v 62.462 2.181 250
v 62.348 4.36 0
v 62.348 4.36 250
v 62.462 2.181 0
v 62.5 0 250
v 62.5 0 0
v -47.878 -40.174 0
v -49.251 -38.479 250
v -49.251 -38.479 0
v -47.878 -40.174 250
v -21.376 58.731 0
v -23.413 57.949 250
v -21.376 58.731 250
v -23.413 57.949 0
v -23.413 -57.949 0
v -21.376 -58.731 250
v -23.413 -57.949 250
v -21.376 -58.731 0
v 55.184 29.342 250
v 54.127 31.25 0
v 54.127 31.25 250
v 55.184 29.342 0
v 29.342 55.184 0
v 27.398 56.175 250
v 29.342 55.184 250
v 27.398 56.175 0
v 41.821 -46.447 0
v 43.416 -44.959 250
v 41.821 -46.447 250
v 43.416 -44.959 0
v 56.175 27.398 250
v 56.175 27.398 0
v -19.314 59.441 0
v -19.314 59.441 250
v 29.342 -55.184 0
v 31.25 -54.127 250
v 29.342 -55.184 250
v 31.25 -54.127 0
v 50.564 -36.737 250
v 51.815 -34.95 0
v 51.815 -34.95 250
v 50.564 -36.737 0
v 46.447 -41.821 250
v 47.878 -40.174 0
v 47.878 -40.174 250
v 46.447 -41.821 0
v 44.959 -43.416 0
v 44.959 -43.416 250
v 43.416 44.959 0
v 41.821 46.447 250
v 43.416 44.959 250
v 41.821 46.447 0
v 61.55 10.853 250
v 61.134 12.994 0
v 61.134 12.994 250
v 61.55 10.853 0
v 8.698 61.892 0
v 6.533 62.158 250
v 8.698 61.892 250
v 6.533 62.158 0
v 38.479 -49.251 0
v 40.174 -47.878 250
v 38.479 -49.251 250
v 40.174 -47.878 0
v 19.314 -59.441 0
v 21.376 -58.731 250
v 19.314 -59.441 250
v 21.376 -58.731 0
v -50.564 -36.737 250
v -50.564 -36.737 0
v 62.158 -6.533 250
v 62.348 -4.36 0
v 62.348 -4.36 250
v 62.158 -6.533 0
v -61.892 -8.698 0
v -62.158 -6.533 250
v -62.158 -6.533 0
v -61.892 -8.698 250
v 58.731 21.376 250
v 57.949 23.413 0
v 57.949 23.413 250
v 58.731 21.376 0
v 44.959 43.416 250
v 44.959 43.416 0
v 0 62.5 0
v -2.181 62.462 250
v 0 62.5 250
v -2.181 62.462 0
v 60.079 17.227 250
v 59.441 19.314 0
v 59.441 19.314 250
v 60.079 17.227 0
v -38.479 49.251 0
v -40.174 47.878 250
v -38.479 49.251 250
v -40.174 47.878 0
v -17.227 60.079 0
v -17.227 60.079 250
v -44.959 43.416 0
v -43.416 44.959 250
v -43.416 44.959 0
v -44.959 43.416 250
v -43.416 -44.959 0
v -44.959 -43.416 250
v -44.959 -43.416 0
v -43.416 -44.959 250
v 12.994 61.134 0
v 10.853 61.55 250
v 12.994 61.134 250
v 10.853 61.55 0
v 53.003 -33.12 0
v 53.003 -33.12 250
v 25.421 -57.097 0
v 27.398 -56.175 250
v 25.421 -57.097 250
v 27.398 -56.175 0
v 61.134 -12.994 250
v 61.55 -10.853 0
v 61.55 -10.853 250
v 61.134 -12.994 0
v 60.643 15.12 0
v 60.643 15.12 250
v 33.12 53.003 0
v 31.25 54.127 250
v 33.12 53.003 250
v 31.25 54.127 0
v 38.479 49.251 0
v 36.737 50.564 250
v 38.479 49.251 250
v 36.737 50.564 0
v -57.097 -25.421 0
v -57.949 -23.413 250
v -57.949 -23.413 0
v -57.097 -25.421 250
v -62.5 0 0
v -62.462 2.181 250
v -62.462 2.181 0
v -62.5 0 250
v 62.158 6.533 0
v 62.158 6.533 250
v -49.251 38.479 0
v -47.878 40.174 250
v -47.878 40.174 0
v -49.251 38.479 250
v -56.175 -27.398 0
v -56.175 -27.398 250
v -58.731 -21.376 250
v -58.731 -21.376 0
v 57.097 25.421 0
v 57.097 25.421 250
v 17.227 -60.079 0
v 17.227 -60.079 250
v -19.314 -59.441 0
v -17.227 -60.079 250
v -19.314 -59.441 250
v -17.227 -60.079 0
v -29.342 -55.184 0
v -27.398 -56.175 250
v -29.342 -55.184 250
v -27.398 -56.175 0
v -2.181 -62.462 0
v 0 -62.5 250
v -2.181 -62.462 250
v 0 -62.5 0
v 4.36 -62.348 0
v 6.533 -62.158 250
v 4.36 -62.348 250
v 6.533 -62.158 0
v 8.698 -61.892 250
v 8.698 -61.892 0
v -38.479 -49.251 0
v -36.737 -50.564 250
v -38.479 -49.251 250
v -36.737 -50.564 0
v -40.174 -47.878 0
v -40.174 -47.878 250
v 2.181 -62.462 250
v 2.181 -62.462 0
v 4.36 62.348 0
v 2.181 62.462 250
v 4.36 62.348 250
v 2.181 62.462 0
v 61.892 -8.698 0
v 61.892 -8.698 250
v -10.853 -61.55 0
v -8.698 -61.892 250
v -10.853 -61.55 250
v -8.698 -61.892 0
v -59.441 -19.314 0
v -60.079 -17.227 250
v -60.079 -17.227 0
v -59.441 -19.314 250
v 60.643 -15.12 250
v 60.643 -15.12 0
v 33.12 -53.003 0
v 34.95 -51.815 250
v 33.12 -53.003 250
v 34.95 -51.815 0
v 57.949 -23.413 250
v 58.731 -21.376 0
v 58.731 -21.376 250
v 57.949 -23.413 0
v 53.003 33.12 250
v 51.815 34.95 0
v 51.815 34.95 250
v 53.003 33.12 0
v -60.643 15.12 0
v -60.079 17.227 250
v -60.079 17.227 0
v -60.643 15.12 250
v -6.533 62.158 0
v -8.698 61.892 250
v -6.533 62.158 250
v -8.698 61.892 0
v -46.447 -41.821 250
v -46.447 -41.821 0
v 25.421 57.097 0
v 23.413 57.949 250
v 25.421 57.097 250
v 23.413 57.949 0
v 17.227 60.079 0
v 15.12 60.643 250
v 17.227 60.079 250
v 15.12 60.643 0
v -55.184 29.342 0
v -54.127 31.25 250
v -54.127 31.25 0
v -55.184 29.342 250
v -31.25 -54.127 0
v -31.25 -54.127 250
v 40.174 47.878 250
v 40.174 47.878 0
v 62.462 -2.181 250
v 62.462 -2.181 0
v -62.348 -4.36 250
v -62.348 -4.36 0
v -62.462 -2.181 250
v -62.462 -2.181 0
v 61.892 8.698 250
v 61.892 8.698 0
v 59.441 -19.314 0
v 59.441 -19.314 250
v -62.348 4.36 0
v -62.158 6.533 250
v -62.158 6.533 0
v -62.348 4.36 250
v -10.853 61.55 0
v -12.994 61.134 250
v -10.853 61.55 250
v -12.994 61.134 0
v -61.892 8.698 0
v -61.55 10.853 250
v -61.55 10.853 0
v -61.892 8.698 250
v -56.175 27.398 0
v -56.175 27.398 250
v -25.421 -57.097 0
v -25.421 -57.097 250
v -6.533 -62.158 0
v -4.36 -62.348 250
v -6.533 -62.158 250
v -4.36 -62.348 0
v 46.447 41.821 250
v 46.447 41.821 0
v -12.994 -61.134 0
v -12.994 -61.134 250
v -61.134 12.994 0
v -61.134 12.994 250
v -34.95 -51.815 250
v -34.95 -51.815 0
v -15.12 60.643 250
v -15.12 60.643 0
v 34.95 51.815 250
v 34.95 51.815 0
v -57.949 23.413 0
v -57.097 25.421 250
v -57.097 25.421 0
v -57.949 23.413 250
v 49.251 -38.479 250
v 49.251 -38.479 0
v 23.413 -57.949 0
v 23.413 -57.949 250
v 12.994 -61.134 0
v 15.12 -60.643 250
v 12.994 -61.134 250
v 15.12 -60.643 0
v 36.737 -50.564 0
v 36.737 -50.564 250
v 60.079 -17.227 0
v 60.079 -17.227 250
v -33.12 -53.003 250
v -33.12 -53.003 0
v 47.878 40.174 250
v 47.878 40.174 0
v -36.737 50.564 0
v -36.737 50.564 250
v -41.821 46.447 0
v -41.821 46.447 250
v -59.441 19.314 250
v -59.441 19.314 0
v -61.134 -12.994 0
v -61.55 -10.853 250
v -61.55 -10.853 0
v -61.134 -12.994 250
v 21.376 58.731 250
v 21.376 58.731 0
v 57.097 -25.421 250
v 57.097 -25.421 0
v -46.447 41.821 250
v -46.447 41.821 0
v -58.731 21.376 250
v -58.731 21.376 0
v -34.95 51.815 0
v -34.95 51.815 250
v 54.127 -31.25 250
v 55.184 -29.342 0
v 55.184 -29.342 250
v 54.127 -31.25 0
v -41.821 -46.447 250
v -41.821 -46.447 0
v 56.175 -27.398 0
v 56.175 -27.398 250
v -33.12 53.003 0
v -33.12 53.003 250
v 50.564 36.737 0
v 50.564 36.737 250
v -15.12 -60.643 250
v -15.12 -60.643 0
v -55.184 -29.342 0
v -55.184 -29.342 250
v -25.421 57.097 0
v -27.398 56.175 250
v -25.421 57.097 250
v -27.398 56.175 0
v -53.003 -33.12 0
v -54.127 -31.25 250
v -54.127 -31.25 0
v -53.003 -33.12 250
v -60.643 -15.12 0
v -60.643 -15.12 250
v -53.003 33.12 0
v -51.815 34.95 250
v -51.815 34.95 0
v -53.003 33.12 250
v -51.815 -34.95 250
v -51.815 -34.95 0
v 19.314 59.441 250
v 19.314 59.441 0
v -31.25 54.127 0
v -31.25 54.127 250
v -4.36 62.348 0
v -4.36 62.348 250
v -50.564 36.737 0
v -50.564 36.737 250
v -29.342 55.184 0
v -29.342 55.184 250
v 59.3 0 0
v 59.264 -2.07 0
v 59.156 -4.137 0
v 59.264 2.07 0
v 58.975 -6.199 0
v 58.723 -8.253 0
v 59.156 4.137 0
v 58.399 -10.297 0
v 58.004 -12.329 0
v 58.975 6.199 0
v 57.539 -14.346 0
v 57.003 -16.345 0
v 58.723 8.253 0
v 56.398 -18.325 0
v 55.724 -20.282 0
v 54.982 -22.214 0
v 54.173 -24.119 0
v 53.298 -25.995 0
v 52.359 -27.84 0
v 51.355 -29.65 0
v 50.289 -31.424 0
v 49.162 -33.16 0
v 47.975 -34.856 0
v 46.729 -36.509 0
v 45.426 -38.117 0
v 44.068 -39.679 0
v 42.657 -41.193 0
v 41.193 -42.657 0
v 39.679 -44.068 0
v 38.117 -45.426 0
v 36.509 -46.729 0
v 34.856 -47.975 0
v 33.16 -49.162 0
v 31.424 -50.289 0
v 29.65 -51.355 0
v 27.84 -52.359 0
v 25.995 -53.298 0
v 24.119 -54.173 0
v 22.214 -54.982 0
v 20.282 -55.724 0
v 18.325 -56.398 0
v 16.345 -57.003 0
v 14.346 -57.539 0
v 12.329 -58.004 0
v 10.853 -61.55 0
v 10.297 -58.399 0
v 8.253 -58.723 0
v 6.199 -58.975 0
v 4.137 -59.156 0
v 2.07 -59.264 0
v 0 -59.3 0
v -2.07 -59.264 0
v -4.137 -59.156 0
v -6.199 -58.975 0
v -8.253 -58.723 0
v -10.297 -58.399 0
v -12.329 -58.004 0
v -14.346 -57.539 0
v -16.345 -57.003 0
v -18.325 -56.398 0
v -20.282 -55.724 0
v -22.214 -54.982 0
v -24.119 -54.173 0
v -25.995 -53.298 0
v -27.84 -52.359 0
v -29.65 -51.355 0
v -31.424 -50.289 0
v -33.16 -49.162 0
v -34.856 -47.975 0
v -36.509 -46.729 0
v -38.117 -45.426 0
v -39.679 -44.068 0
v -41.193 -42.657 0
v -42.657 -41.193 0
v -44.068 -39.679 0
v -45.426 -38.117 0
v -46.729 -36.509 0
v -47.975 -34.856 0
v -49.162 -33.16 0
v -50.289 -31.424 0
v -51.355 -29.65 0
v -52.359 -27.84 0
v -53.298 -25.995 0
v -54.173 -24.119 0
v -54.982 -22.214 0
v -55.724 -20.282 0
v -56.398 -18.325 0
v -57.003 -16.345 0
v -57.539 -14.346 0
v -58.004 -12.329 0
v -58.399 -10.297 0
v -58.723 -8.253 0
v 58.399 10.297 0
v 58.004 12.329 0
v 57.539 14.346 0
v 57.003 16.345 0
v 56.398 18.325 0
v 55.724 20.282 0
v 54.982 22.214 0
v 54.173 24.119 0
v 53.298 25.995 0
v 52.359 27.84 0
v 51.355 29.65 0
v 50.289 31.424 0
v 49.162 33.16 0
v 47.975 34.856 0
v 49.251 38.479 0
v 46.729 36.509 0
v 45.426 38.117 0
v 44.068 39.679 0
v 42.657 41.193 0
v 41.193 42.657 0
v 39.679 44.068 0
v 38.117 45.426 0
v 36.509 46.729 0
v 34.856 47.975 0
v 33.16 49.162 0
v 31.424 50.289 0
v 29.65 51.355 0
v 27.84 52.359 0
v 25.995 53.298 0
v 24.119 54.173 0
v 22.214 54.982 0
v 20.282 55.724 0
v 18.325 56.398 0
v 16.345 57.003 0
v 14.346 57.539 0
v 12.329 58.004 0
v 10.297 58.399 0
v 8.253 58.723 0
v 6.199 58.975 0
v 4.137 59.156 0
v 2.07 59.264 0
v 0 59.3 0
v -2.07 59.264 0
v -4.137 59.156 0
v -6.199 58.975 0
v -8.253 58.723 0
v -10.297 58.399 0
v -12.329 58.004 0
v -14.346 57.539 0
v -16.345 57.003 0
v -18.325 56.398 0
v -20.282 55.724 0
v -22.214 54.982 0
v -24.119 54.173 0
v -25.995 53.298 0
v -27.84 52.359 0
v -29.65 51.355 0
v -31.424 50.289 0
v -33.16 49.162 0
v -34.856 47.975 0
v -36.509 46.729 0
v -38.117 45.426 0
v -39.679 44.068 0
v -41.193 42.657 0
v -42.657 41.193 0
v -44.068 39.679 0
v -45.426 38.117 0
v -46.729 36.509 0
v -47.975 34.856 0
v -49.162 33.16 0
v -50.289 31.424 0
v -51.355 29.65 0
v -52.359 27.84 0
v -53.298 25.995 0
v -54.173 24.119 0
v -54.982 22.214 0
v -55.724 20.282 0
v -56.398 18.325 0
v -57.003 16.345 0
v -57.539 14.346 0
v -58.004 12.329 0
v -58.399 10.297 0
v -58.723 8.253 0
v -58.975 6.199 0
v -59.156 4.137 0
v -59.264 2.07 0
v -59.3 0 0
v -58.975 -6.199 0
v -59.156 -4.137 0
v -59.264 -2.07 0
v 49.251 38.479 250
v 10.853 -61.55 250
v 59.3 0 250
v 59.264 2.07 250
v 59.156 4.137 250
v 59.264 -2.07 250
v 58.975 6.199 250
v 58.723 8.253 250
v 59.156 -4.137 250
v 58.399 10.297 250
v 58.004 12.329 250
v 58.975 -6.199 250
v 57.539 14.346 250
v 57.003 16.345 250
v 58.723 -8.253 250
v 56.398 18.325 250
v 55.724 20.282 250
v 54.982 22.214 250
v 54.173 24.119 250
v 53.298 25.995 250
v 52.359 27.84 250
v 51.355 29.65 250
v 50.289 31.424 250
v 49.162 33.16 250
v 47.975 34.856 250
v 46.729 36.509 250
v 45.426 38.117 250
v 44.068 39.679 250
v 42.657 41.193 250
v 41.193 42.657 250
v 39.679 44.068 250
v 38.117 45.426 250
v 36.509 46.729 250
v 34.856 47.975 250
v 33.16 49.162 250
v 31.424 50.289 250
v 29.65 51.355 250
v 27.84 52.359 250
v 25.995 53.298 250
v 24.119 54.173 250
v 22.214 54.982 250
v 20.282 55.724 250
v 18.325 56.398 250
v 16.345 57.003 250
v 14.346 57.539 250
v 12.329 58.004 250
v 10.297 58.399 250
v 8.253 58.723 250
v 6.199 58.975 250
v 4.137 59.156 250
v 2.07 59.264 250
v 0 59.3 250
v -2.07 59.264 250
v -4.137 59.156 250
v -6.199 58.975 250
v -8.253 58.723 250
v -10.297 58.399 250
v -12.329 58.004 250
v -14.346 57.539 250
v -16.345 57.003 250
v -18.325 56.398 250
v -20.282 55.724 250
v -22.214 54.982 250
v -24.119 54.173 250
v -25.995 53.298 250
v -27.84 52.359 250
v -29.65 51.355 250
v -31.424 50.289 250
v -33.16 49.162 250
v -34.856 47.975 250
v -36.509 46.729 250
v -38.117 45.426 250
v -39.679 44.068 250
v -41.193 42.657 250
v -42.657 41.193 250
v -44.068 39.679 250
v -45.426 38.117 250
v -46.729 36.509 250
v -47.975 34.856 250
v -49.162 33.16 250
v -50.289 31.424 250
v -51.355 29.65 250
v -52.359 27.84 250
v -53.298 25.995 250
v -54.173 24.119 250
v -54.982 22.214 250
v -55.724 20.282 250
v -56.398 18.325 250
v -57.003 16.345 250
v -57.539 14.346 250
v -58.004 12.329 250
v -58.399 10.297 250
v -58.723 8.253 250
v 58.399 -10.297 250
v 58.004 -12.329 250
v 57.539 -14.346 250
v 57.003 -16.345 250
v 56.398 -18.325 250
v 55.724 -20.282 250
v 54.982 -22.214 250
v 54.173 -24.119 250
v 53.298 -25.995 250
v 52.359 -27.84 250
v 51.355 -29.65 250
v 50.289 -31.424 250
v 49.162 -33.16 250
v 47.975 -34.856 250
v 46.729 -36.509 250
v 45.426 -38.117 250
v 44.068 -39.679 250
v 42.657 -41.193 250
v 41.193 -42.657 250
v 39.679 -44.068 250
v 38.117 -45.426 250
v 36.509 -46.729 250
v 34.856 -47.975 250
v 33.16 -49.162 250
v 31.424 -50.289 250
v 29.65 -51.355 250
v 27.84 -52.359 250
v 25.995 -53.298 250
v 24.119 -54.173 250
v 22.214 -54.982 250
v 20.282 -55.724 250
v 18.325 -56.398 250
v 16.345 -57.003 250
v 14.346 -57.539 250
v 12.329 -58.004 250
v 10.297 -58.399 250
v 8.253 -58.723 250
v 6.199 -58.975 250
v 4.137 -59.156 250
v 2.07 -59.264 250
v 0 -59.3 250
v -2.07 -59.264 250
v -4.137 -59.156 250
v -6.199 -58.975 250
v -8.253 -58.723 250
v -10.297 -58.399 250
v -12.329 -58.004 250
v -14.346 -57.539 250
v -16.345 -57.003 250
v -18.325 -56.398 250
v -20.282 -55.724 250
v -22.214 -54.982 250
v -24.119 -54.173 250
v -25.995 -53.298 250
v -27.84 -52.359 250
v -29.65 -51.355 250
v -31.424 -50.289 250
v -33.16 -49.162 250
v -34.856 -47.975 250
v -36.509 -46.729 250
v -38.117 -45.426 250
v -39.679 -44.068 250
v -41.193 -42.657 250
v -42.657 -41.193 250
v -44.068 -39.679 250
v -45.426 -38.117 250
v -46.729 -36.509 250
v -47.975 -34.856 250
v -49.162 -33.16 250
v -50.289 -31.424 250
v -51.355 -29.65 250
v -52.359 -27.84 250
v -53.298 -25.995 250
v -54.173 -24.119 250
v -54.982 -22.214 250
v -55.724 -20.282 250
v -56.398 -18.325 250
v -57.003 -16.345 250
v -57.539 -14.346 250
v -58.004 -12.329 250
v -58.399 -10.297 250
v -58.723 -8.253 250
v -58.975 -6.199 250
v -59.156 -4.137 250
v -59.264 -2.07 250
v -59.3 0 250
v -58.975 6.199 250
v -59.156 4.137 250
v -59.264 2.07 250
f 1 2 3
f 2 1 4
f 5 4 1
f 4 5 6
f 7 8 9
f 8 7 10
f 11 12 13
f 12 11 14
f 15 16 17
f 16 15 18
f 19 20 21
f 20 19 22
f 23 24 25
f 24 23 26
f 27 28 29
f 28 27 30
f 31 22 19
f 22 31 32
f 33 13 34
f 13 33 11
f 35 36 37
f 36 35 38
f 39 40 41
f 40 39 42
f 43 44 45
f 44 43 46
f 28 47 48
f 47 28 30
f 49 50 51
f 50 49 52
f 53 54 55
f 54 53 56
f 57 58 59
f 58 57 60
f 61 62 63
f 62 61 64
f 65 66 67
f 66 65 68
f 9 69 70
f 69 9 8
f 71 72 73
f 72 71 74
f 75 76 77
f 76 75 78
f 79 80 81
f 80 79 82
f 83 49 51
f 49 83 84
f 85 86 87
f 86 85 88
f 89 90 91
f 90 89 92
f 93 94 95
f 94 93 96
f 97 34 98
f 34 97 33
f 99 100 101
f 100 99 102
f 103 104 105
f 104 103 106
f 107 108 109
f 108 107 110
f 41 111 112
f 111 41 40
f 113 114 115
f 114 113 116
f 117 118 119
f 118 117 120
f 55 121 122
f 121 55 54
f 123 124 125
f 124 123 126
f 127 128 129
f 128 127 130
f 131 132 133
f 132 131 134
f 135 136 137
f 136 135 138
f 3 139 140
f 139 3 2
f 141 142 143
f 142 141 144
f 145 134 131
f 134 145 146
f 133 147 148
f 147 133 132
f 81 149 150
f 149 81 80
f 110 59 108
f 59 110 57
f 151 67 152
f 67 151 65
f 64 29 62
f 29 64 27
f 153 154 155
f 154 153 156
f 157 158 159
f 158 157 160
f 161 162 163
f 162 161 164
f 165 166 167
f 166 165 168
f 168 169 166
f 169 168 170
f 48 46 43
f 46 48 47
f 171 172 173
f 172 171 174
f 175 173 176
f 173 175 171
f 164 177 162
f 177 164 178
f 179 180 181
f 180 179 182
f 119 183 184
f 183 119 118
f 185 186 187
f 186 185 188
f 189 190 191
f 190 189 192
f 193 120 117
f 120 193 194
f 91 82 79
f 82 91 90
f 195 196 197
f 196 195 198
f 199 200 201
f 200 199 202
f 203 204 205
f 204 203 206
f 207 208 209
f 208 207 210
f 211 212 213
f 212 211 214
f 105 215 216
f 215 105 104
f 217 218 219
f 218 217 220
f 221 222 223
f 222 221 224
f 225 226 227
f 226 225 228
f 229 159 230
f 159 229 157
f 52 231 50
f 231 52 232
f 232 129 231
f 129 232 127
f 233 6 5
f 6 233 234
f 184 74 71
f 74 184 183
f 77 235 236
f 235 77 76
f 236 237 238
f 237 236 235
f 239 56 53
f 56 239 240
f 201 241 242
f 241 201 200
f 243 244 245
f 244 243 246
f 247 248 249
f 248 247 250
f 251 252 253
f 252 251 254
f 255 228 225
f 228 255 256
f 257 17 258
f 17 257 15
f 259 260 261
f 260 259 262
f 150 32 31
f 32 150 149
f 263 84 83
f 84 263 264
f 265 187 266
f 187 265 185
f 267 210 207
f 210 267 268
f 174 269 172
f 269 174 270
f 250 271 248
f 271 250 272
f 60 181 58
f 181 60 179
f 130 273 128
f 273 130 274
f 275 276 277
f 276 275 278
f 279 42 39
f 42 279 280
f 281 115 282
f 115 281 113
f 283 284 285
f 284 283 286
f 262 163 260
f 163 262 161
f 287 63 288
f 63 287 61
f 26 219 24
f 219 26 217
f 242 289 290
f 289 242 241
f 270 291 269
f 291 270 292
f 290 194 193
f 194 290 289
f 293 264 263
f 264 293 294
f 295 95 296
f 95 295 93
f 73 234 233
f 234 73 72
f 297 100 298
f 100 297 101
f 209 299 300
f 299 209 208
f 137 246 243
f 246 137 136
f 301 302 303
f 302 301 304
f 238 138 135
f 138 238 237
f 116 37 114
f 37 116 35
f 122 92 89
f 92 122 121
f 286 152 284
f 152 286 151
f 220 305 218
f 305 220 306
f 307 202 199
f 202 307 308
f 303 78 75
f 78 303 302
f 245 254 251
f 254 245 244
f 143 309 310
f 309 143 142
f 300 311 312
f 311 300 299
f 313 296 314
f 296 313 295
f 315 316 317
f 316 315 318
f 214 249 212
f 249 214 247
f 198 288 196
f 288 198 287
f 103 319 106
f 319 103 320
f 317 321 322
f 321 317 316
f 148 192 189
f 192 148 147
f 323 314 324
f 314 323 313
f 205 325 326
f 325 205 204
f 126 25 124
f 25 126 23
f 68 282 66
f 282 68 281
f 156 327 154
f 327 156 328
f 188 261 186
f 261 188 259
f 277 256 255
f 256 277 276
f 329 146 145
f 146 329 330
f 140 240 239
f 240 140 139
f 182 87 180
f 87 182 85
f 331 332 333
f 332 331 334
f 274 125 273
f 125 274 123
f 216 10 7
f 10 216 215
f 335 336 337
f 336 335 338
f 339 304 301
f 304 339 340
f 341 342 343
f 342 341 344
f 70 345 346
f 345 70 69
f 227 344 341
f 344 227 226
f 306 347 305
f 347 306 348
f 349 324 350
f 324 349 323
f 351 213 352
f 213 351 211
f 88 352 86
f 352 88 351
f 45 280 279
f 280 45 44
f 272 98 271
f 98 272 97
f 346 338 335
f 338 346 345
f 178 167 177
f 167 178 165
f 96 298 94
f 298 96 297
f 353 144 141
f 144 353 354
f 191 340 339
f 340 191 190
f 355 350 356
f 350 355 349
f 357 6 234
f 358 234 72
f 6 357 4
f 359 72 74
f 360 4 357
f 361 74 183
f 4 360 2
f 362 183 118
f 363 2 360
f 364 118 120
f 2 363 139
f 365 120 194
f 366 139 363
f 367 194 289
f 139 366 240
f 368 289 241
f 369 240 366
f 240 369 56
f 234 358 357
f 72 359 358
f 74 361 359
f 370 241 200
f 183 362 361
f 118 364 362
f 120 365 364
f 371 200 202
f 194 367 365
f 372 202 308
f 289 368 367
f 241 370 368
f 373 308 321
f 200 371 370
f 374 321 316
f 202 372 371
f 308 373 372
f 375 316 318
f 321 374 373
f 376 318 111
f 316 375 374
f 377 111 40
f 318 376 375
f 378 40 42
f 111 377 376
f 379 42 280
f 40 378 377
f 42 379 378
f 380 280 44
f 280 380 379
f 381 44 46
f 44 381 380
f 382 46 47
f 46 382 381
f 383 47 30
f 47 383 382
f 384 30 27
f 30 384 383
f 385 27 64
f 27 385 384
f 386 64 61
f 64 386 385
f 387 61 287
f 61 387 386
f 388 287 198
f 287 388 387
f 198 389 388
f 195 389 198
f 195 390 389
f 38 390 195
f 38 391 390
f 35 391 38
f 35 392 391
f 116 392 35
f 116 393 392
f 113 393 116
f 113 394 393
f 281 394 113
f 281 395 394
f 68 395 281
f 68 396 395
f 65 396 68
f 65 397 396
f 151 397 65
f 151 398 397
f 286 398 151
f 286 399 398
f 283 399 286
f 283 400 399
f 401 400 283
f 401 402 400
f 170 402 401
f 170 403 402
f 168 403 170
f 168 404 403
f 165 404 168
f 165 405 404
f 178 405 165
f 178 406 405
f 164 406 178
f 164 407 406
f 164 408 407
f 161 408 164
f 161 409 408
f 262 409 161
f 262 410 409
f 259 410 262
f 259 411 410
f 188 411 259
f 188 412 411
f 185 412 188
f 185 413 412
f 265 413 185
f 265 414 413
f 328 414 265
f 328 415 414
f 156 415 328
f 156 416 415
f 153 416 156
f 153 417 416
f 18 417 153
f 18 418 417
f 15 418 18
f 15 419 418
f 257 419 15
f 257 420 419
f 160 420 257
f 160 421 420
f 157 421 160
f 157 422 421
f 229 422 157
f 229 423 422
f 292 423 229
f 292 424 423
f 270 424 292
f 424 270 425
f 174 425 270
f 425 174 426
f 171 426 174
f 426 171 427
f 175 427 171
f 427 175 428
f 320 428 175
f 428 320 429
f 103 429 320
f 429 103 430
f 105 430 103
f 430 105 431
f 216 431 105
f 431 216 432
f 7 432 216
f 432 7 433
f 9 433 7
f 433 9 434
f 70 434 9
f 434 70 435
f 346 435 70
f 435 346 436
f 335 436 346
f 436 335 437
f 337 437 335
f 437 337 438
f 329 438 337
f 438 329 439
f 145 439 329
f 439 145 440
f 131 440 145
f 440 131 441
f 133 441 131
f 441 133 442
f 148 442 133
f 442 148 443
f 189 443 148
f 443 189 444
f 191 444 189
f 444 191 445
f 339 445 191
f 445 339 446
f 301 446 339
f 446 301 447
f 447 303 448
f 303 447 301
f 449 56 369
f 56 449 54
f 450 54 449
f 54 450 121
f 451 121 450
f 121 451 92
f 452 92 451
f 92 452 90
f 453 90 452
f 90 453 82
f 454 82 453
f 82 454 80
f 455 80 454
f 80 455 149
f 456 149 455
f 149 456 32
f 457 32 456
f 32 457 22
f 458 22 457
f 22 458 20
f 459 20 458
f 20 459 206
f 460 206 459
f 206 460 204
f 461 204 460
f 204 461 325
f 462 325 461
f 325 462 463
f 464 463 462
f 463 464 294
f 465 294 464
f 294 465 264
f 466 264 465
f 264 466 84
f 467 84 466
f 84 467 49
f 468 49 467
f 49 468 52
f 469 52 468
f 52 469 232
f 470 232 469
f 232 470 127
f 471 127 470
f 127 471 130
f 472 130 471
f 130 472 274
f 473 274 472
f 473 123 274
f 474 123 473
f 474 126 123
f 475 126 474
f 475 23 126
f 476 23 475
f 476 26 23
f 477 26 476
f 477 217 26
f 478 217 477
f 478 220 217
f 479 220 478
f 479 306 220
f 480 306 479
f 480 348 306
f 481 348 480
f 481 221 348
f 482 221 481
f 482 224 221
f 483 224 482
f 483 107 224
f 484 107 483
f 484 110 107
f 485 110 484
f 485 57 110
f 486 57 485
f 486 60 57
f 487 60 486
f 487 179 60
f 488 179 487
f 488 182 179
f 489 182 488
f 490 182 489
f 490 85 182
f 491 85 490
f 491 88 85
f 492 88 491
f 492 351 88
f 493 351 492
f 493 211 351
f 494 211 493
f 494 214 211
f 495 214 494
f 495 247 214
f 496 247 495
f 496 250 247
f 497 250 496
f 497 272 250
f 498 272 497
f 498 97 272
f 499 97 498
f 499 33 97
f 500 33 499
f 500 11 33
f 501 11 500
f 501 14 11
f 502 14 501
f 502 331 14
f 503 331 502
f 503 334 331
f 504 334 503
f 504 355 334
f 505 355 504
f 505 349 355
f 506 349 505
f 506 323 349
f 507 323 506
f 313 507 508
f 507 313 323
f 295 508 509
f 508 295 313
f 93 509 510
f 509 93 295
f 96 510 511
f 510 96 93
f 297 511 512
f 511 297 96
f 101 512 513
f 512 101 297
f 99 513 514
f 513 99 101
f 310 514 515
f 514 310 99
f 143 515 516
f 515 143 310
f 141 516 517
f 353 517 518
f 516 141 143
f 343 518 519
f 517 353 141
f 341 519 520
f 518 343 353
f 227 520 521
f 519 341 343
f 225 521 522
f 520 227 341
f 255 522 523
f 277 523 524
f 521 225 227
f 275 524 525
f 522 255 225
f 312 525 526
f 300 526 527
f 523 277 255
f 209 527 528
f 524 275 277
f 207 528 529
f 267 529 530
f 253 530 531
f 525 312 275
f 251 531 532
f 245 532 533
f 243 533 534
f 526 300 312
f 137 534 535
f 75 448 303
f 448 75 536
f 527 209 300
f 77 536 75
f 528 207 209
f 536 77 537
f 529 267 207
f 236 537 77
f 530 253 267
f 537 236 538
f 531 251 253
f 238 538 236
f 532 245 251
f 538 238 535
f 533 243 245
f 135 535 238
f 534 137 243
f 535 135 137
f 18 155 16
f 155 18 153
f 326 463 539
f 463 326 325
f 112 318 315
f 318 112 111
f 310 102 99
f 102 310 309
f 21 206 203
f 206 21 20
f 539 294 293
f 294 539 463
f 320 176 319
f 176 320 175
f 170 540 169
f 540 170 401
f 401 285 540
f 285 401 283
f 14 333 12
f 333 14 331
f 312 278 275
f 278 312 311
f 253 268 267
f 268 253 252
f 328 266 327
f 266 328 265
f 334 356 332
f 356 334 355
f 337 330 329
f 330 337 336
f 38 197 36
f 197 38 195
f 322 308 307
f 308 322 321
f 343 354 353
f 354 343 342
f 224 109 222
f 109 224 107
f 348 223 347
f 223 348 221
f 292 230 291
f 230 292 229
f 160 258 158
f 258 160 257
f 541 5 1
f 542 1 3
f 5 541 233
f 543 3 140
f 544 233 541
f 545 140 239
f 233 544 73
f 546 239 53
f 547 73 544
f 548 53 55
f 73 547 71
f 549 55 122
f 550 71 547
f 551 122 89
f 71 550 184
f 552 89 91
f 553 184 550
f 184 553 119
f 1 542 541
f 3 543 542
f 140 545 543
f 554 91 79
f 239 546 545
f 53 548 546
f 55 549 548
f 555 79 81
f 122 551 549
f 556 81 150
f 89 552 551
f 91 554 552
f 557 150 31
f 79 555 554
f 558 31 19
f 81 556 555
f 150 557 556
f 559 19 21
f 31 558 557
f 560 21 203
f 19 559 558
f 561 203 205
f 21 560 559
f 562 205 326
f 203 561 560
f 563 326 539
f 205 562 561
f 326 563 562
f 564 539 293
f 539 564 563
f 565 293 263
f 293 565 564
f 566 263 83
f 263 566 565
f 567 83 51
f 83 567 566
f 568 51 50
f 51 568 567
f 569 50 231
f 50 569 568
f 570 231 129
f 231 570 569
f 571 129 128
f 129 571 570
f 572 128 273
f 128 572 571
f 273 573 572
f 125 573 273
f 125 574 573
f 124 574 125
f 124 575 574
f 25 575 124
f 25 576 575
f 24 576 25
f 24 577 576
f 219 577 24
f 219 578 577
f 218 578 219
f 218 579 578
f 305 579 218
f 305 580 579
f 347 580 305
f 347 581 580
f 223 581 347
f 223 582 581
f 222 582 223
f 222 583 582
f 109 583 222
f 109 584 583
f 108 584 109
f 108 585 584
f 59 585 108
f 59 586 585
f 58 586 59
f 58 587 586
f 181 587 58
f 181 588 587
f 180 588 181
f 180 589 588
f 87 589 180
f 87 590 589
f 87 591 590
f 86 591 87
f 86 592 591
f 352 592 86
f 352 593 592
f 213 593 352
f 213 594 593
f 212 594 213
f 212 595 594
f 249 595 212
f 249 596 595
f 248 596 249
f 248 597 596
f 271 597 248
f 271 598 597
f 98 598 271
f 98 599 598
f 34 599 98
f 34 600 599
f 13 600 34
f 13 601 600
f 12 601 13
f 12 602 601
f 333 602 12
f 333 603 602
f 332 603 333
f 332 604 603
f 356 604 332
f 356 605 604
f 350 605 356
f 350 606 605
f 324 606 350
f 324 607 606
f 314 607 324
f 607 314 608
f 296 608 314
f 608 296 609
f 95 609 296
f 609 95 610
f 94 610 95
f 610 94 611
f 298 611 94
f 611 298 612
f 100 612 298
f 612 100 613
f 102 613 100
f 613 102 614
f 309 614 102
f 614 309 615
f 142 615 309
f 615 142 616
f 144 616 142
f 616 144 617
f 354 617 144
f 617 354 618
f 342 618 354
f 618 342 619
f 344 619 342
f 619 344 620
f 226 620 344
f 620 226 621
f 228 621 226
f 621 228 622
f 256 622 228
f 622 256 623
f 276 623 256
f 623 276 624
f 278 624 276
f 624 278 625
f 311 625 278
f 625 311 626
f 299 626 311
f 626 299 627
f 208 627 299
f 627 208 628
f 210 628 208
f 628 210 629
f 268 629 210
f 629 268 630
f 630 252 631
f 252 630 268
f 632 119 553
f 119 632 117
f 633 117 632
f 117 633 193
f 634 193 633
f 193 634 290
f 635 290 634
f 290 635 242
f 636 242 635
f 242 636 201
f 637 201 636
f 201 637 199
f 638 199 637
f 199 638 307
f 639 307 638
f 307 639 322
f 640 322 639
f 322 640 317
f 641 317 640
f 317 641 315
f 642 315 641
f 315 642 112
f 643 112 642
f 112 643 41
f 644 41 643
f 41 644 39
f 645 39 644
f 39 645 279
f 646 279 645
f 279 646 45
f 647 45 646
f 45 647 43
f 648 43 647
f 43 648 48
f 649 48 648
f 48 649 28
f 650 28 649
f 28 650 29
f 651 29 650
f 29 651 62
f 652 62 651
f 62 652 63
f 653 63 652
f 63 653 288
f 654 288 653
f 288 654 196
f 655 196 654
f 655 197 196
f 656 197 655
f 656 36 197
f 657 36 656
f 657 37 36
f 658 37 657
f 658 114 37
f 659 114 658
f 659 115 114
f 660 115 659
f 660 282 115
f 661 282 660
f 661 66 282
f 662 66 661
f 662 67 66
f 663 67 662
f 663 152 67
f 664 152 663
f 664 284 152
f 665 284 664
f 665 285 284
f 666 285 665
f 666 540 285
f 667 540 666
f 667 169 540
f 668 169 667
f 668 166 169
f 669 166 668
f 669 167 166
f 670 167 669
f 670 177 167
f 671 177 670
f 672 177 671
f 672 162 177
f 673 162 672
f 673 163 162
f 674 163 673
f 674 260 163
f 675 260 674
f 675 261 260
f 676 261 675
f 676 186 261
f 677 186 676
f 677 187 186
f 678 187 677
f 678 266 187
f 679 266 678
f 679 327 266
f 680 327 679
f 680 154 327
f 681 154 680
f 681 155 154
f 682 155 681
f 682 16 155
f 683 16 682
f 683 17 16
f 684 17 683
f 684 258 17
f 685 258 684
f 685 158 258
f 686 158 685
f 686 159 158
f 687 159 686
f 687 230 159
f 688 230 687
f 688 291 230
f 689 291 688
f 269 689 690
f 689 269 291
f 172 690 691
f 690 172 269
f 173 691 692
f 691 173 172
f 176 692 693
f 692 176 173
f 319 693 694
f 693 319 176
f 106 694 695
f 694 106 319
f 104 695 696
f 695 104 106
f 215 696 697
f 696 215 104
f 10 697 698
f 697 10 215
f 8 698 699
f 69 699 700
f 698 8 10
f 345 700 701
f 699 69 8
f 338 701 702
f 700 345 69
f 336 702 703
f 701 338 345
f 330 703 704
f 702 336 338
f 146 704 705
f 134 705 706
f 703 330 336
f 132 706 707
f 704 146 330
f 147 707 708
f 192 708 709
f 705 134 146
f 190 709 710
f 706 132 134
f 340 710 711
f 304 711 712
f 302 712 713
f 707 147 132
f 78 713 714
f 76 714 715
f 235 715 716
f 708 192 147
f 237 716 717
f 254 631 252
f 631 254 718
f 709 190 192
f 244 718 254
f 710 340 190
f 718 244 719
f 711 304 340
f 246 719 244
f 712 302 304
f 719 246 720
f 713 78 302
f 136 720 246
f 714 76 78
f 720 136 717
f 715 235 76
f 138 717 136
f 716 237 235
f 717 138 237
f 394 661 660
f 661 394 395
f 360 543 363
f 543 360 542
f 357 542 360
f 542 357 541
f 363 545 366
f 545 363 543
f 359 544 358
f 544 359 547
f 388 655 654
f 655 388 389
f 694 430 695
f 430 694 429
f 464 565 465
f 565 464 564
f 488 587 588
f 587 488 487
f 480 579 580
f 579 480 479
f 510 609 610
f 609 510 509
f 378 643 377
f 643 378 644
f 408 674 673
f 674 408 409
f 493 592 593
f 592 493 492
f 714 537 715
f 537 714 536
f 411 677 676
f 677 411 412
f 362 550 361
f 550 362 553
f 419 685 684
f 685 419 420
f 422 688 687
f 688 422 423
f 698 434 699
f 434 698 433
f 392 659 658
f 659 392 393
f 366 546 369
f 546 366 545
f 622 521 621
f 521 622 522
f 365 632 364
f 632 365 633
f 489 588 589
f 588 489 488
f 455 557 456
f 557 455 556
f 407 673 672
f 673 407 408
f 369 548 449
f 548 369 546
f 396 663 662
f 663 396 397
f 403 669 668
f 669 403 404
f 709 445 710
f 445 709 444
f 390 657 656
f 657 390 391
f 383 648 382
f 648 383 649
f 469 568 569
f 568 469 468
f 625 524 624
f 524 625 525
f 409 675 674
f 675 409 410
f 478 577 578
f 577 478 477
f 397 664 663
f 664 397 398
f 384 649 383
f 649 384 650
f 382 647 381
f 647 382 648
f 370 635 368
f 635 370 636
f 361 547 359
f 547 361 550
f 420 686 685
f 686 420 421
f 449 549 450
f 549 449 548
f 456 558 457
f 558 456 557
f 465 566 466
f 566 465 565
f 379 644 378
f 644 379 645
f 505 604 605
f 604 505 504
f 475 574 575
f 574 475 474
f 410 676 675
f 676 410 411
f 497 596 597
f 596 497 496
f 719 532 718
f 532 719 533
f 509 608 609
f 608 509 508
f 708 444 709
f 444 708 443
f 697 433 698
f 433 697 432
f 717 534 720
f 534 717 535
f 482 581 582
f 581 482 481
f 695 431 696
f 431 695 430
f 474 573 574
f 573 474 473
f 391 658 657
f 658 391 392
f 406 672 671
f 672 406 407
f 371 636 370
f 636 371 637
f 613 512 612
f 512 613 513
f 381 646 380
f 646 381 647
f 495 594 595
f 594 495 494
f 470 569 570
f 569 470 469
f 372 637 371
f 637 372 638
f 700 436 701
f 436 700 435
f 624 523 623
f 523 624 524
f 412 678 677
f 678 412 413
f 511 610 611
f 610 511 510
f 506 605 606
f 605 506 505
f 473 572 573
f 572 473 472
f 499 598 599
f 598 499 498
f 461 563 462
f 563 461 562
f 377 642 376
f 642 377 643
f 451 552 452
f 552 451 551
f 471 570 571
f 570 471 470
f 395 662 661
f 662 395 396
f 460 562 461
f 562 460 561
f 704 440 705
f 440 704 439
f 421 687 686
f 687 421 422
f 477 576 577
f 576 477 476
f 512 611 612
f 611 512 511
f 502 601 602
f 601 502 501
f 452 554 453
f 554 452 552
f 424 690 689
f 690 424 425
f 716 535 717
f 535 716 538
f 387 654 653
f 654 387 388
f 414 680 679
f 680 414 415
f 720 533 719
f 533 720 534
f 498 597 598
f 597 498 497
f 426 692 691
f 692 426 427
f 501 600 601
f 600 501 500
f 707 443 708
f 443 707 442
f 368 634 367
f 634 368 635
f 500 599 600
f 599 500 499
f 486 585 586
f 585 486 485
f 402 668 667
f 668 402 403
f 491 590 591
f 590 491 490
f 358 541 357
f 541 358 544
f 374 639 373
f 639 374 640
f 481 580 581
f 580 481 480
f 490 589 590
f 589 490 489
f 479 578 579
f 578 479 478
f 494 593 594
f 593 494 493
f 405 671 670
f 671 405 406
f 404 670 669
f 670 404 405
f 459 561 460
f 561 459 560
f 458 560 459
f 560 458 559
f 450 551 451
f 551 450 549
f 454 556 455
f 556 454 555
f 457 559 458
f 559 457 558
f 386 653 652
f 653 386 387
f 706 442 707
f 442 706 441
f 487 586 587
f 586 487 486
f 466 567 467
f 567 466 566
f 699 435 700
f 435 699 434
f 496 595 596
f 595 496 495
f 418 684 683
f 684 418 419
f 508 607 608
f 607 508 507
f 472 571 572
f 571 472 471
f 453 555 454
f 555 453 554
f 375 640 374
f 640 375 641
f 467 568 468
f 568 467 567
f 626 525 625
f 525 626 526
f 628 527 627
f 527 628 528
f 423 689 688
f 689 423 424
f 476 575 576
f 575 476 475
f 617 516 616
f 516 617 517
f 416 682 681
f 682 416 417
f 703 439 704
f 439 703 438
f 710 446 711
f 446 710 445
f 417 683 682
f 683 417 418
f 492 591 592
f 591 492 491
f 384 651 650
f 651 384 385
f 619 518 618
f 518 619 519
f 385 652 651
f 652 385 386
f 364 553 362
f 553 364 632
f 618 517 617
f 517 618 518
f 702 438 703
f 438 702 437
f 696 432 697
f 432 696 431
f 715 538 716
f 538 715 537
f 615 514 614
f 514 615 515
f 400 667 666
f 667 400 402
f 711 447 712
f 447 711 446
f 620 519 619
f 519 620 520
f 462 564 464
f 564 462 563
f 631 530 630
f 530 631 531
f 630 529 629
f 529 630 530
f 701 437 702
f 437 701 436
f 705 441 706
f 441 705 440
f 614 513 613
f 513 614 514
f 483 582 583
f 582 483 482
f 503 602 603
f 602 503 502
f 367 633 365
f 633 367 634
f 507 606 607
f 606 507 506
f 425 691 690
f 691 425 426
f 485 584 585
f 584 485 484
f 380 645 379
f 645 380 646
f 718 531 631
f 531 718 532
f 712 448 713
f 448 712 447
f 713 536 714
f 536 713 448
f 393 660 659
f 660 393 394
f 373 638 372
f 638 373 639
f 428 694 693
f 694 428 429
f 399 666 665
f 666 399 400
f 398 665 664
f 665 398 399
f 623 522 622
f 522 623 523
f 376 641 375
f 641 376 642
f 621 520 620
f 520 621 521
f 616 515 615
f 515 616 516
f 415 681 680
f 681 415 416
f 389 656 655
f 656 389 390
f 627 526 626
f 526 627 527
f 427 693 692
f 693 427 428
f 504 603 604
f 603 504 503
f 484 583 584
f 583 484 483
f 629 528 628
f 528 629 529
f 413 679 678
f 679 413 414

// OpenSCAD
$fn = 180;

// HT pipe parameters (approximate, adjustable)
pipe_dn = 125;          // nominal diameter (mm)
pipe_length = 250;      // length (mm)
wall_thickness = 3.2;   // typical HT wall thickness (mm), adjust if needed

// Derived
outer_d = pipe_dn;
inner_d = outer_d - 2*wall_thickness;

module ht_pipe(od, id, L) {
    difference() {
        cylinder(h = L, d = od, center = false);
        translate([0,0,-0.1])
            cylinder(h = L + 0.2, d = id, center = false);
    }
}

ht_pipe(outer_d, inner_d, pipe_length);
